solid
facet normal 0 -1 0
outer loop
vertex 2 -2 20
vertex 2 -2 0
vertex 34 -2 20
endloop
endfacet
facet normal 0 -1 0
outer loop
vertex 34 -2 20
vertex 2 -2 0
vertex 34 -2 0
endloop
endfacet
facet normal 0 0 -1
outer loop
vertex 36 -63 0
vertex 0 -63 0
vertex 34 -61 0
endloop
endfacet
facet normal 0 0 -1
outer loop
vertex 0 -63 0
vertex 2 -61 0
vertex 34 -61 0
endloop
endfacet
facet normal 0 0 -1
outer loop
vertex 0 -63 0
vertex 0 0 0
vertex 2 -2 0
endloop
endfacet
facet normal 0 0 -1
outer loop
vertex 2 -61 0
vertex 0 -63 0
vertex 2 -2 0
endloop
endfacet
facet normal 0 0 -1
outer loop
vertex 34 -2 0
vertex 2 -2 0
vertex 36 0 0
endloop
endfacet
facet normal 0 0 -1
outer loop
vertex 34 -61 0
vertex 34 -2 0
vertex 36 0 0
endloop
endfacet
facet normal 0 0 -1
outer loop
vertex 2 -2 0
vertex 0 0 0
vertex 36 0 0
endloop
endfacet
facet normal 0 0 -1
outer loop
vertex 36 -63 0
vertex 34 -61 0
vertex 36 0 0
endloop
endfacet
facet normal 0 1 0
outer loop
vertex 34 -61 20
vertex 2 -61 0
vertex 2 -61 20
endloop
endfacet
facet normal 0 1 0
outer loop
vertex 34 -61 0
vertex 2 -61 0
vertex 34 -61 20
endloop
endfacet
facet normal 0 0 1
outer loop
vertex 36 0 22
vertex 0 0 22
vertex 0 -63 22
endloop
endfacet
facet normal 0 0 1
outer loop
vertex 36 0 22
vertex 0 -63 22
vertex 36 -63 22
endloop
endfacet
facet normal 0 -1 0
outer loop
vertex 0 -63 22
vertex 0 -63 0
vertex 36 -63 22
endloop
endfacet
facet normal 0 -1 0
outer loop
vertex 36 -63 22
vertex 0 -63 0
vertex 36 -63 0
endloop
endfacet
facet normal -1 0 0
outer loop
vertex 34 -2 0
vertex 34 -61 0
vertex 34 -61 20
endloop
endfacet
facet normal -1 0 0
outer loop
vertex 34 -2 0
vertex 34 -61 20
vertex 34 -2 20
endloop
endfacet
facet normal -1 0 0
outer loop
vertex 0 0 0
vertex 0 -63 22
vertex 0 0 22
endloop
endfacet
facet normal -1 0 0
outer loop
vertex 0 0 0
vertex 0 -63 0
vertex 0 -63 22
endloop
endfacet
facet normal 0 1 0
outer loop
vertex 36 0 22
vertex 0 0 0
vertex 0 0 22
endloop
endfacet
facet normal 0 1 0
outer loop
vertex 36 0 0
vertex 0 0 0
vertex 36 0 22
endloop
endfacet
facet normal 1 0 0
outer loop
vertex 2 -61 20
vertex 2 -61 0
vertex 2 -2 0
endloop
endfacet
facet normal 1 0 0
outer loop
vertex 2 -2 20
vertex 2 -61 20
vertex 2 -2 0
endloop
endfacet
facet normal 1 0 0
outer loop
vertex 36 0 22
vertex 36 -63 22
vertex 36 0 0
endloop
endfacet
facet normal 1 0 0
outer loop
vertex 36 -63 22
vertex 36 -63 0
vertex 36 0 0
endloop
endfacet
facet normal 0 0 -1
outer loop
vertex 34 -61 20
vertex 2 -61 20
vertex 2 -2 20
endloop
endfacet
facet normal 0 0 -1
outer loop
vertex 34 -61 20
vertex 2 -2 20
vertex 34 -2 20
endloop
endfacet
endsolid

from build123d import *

# Parameters (mm, degrees)
SKETCH1_W         = 36
SKETCH1_H         = 63
SKETCH1_W_2       = 32
SKETCH1_H_2       = 59
WALL_HEIGHT_DEPTH = 20
ROOF_START        = 20
SKETCH1_3_W       = 36
SKETCH1_3_H       = 63
SKETCH1_3_W_2     = 32
SKETCH1_3_H_2     = 59
ROOF_DEPTH        = 2


with BuildPart() as part:
    # Sketch1 → Wall_Height (new body)
    with BuildSketch(Plane.XY):
        with Locations((18, -31.5)):
            Rectangle(SKETCH1_W, SKETCH1_H)
        with Locations((18, -31.5)):
            Rectangle(SKETCH1_W_2, SKETCH1_H_2, mode=Mode.SUBTRACT)
    extrude(amount=WALL_HEIGHT_DEPTH)

    # Sketch1<3> → Roof (add)
    # profile 1 of 2: a face of its own
    with BuildSketch(Plane.XY.offset(ROOF_START)):
        with Locations((18, -31.5)):
            Rectangle(SKETCH1_3_W, SKETCH1_3_H)
        with Locations((18, -31.5)):
            Rectangle(SKETCH1_3_W_2, SKETCH1_3_H_2, mode=Mode.SUBTRACT)
    # profile 2 of 2: a face of its own
    with BuildSketch(Plane.XY.offset(ROOF_START)):
        with Locations((18, -31.5)):
            Rectangle(SKETCH1_3_W_2, SKETCH1_3_H_2)
    extrude(amount=ROOF_DEPTH)


solid = part.part
